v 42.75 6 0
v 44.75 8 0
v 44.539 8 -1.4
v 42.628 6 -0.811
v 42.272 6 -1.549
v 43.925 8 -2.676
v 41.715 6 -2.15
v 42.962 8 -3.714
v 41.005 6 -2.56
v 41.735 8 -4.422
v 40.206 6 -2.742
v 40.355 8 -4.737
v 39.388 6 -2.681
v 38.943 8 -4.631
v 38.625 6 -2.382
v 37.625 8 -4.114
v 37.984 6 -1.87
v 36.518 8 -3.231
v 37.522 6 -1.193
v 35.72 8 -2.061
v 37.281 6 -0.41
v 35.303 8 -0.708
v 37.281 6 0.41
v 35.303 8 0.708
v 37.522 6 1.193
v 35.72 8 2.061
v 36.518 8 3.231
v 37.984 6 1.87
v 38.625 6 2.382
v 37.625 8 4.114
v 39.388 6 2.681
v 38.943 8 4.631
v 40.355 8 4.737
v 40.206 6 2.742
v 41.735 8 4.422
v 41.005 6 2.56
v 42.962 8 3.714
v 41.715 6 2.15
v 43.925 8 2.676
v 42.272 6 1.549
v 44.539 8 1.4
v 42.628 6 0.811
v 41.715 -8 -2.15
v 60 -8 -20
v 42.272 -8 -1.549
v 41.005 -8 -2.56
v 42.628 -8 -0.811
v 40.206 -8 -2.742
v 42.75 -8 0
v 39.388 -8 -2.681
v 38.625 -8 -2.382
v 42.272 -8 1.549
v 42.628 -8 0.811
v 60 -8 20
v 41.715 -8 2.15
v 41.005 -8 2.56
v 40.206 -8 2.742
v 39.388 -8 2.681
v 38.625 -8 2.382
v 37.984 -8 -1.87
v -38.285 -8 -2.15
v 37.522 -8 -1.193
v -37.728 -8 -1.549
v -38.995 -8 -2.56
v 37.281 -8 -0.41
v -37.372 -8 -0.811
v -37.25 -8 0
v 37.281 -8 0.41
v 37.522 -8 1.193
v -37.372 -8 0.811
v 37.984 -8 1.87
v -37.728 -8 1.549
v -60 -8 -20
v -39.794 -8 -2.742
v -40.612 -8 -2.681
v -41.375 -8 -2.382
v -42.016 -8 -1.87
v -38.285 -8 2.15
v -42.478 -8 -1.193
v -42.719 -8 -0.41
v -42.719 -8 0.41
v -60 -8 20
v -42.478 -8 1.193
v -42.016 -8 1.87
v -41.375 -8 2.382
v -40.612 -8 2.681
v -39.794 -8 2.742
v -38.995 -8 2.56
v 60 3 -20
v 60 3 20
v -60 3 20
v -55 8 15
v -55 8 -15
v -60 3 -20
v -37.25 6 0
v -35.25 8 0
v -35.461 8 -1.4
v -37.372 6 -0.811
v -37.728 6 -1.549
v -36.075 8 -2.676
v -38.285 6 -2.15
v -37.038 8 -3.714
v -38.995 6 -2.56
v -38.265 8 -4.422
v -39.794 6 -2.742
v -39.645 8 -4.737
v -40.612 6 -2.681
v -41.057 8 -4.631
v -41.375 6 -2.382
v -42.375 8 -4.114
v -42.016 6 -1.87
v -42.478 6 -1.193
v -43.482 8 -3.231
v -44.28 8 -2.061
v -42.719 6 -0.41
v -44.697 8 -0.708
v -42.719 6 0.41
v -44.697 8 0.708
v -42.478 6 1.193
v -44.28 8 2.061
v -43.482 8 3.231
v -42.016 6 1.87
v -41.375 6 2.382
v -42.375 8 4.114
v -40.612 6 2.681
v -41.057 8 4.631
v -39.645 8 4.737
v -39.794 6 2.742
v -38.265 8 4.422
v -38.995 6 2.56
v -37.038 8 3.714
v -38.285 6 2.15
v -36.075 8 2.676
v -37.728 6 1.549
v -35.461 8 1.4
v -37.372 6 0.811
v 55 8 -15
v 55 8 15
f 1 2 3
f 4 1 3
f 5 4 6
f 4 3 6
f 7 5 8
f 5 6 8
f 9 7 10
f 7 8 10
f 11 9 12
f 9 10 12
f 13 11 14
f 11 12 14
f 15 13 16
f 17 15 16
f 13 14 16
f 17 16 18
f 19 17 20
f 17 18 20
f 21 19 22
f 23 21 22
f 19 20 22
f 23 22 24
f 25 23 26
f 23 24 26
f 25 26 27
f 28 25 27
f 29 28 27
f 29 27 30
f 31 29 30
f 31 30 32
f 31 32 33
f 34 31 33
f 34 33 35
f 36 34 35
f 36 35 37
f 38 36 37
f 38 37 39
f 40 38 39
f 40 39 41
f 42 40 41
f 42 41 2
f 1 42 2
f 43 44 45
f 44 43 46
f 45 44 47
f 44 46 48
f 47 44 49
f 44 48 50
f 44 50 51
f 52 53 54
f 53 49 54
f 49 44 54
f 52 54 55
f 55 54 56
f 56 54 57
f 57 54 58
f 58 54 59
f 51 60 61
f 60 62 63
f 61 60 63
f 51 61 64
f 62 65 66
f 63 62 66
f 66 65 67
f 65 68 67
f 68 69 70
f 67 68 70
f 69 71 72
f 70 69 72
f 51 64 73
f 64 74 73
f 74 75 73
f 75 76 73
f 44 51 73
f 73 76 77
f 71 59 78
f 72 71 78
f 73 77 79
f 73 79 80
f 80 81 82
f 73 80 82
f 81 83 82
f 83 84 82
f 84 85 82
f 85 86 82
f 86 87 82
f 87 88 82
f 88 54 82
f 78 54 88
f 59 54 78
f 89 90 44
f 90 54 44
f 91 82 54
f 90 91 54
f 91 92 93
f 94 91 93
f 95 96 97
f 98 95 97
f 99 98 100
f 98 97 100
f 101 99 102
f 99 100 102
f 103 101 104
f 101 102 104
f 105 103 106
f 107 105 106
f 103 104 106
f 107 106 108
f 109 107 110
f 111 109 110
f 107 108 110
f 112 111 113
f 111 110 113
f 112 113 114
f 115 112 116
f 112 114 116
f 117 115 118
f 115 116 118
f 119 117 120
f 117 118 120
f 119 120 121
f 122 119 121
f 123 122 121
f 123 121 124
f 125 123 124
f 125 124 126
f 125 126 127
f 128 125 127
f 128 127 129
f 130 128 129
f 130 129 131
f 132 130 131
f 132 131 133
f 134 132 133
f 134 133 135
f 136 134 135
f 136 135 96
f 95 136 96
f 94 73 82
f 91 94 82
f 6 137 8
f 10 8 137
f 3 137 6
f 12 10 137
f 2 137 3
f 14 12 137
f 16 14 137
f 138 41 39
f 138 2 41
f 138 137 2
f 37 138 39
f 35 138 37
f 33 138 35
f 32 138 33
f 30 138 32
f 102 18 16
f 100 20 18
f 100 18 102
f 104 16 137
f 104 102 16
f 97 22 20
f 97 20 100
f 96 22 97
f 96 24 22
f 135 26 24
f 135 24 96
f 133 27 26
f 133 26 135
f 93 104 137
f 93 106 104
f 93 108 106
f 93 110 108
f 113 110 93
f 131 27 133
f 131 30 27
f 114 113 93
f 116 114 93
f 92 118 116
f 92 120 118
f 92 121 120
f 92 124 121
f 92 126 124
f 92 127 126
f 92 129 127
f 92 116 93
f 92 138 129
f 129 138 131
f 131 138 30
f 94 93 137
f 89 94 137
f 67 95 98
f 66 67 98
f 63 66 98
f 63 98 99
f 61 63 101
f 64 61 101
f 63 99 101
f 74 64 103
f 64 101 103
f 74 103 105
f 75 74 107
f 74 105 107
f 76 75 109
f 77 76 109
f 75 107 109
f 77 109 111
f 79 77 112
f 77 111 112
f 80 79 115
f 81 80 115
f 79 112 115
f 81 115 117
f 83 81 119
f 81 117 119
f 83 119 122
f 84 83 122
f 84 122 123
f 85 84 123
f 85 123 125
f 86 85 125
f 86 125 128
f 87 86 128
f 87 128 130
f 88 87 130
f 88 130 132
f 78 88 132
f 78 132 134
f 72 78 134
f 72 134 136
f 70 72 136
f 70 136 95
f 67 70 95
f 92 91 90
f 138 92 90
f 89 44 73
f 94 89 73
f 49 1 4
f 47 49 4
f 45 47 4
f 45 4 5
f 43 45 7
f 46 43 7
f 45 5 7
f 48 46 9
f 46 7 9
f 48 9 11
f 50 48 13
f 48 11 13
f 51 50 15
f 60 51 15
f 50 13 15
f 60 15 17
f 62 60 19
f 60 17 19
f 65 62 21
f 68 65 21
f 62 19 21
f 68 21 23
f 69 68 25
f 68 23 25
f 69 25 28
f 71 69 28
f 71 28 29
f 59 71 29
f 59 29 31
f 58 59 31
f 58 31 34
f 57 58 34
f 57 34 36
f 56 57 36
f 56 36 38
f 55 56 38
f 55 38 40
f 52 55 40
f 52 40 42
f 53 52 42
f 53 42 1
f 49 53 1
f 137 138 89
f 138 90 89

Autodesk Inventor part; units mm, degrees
ref_plane "YZ Plane" through (0, 0, 0) normal (1, 0, 0) x (0, 1, 0)
ref_plane "XZ Plane" through (0, 0, 0) normal (0, 1, 0) x (-1, 0, 0)
ref_plane "XY Plane" through (0, 0, 0) normal (0, 0, 1) x (1, 0, 0)
sketch "Sketch1" plane through (0, 0, 0) normal (0, 1, 0) x (-1, 0, 0)
  line L0 (60, 20) -> (-60, 20)
  line L1 (-60, 20) -> (-60, -20)
  line L2 (-60, -20) -> (60, -20)
  line L3 (60, -20) -> (60, 20)
  line L4 (0, 0) -> (-60, 0) construction
  line L5 (0, 0) -> (0, -20) construction
  dimension "d0" = 120
  dimension "d1" = 40
extrude "Extrusion1" add sketch "Sketch1" along normal mid plane 16
sketch "Sketch2" plane through (0, 8, 0) normal (0, 1, 0) x (1, 0, 0)
  line L0 (-60, -20) -> (60, -20) projected
  line L1 (60, -20) -> (60, 20) projected
  line L2 (60, 20) -> (-60, 20) projected
  line L3 (-60, 20) -> (-60, -20) projected
  circle A0 centre (-40, 0) radius 2.75
  circle A1 centre (40, 0) radius 2.75
  line L4 (-60, 0) -> (60, 0) construction
  line L5 (0, 20) -> (0, -20) construction
  point P0 (0, 0)
  dimension "d5" = 5.5
  dimension "d7" = 40
extrude "Extrusion2" cut sketch "Sketch2" against normal through all contours A0 | A1
chamfer "Chamfer1" distance 5 angle 45 4 edges at (-60, 8, 0) (0, 8, 20) (0, 8, -20) (60, 8, 0)
chamfer "Chamfer2" distance 2 angle 45 2 edges at (-42.75, 8, 0) (37.25, 8, 0)
properties part number "Link" material "MDF Medium Density Fiberboard"
